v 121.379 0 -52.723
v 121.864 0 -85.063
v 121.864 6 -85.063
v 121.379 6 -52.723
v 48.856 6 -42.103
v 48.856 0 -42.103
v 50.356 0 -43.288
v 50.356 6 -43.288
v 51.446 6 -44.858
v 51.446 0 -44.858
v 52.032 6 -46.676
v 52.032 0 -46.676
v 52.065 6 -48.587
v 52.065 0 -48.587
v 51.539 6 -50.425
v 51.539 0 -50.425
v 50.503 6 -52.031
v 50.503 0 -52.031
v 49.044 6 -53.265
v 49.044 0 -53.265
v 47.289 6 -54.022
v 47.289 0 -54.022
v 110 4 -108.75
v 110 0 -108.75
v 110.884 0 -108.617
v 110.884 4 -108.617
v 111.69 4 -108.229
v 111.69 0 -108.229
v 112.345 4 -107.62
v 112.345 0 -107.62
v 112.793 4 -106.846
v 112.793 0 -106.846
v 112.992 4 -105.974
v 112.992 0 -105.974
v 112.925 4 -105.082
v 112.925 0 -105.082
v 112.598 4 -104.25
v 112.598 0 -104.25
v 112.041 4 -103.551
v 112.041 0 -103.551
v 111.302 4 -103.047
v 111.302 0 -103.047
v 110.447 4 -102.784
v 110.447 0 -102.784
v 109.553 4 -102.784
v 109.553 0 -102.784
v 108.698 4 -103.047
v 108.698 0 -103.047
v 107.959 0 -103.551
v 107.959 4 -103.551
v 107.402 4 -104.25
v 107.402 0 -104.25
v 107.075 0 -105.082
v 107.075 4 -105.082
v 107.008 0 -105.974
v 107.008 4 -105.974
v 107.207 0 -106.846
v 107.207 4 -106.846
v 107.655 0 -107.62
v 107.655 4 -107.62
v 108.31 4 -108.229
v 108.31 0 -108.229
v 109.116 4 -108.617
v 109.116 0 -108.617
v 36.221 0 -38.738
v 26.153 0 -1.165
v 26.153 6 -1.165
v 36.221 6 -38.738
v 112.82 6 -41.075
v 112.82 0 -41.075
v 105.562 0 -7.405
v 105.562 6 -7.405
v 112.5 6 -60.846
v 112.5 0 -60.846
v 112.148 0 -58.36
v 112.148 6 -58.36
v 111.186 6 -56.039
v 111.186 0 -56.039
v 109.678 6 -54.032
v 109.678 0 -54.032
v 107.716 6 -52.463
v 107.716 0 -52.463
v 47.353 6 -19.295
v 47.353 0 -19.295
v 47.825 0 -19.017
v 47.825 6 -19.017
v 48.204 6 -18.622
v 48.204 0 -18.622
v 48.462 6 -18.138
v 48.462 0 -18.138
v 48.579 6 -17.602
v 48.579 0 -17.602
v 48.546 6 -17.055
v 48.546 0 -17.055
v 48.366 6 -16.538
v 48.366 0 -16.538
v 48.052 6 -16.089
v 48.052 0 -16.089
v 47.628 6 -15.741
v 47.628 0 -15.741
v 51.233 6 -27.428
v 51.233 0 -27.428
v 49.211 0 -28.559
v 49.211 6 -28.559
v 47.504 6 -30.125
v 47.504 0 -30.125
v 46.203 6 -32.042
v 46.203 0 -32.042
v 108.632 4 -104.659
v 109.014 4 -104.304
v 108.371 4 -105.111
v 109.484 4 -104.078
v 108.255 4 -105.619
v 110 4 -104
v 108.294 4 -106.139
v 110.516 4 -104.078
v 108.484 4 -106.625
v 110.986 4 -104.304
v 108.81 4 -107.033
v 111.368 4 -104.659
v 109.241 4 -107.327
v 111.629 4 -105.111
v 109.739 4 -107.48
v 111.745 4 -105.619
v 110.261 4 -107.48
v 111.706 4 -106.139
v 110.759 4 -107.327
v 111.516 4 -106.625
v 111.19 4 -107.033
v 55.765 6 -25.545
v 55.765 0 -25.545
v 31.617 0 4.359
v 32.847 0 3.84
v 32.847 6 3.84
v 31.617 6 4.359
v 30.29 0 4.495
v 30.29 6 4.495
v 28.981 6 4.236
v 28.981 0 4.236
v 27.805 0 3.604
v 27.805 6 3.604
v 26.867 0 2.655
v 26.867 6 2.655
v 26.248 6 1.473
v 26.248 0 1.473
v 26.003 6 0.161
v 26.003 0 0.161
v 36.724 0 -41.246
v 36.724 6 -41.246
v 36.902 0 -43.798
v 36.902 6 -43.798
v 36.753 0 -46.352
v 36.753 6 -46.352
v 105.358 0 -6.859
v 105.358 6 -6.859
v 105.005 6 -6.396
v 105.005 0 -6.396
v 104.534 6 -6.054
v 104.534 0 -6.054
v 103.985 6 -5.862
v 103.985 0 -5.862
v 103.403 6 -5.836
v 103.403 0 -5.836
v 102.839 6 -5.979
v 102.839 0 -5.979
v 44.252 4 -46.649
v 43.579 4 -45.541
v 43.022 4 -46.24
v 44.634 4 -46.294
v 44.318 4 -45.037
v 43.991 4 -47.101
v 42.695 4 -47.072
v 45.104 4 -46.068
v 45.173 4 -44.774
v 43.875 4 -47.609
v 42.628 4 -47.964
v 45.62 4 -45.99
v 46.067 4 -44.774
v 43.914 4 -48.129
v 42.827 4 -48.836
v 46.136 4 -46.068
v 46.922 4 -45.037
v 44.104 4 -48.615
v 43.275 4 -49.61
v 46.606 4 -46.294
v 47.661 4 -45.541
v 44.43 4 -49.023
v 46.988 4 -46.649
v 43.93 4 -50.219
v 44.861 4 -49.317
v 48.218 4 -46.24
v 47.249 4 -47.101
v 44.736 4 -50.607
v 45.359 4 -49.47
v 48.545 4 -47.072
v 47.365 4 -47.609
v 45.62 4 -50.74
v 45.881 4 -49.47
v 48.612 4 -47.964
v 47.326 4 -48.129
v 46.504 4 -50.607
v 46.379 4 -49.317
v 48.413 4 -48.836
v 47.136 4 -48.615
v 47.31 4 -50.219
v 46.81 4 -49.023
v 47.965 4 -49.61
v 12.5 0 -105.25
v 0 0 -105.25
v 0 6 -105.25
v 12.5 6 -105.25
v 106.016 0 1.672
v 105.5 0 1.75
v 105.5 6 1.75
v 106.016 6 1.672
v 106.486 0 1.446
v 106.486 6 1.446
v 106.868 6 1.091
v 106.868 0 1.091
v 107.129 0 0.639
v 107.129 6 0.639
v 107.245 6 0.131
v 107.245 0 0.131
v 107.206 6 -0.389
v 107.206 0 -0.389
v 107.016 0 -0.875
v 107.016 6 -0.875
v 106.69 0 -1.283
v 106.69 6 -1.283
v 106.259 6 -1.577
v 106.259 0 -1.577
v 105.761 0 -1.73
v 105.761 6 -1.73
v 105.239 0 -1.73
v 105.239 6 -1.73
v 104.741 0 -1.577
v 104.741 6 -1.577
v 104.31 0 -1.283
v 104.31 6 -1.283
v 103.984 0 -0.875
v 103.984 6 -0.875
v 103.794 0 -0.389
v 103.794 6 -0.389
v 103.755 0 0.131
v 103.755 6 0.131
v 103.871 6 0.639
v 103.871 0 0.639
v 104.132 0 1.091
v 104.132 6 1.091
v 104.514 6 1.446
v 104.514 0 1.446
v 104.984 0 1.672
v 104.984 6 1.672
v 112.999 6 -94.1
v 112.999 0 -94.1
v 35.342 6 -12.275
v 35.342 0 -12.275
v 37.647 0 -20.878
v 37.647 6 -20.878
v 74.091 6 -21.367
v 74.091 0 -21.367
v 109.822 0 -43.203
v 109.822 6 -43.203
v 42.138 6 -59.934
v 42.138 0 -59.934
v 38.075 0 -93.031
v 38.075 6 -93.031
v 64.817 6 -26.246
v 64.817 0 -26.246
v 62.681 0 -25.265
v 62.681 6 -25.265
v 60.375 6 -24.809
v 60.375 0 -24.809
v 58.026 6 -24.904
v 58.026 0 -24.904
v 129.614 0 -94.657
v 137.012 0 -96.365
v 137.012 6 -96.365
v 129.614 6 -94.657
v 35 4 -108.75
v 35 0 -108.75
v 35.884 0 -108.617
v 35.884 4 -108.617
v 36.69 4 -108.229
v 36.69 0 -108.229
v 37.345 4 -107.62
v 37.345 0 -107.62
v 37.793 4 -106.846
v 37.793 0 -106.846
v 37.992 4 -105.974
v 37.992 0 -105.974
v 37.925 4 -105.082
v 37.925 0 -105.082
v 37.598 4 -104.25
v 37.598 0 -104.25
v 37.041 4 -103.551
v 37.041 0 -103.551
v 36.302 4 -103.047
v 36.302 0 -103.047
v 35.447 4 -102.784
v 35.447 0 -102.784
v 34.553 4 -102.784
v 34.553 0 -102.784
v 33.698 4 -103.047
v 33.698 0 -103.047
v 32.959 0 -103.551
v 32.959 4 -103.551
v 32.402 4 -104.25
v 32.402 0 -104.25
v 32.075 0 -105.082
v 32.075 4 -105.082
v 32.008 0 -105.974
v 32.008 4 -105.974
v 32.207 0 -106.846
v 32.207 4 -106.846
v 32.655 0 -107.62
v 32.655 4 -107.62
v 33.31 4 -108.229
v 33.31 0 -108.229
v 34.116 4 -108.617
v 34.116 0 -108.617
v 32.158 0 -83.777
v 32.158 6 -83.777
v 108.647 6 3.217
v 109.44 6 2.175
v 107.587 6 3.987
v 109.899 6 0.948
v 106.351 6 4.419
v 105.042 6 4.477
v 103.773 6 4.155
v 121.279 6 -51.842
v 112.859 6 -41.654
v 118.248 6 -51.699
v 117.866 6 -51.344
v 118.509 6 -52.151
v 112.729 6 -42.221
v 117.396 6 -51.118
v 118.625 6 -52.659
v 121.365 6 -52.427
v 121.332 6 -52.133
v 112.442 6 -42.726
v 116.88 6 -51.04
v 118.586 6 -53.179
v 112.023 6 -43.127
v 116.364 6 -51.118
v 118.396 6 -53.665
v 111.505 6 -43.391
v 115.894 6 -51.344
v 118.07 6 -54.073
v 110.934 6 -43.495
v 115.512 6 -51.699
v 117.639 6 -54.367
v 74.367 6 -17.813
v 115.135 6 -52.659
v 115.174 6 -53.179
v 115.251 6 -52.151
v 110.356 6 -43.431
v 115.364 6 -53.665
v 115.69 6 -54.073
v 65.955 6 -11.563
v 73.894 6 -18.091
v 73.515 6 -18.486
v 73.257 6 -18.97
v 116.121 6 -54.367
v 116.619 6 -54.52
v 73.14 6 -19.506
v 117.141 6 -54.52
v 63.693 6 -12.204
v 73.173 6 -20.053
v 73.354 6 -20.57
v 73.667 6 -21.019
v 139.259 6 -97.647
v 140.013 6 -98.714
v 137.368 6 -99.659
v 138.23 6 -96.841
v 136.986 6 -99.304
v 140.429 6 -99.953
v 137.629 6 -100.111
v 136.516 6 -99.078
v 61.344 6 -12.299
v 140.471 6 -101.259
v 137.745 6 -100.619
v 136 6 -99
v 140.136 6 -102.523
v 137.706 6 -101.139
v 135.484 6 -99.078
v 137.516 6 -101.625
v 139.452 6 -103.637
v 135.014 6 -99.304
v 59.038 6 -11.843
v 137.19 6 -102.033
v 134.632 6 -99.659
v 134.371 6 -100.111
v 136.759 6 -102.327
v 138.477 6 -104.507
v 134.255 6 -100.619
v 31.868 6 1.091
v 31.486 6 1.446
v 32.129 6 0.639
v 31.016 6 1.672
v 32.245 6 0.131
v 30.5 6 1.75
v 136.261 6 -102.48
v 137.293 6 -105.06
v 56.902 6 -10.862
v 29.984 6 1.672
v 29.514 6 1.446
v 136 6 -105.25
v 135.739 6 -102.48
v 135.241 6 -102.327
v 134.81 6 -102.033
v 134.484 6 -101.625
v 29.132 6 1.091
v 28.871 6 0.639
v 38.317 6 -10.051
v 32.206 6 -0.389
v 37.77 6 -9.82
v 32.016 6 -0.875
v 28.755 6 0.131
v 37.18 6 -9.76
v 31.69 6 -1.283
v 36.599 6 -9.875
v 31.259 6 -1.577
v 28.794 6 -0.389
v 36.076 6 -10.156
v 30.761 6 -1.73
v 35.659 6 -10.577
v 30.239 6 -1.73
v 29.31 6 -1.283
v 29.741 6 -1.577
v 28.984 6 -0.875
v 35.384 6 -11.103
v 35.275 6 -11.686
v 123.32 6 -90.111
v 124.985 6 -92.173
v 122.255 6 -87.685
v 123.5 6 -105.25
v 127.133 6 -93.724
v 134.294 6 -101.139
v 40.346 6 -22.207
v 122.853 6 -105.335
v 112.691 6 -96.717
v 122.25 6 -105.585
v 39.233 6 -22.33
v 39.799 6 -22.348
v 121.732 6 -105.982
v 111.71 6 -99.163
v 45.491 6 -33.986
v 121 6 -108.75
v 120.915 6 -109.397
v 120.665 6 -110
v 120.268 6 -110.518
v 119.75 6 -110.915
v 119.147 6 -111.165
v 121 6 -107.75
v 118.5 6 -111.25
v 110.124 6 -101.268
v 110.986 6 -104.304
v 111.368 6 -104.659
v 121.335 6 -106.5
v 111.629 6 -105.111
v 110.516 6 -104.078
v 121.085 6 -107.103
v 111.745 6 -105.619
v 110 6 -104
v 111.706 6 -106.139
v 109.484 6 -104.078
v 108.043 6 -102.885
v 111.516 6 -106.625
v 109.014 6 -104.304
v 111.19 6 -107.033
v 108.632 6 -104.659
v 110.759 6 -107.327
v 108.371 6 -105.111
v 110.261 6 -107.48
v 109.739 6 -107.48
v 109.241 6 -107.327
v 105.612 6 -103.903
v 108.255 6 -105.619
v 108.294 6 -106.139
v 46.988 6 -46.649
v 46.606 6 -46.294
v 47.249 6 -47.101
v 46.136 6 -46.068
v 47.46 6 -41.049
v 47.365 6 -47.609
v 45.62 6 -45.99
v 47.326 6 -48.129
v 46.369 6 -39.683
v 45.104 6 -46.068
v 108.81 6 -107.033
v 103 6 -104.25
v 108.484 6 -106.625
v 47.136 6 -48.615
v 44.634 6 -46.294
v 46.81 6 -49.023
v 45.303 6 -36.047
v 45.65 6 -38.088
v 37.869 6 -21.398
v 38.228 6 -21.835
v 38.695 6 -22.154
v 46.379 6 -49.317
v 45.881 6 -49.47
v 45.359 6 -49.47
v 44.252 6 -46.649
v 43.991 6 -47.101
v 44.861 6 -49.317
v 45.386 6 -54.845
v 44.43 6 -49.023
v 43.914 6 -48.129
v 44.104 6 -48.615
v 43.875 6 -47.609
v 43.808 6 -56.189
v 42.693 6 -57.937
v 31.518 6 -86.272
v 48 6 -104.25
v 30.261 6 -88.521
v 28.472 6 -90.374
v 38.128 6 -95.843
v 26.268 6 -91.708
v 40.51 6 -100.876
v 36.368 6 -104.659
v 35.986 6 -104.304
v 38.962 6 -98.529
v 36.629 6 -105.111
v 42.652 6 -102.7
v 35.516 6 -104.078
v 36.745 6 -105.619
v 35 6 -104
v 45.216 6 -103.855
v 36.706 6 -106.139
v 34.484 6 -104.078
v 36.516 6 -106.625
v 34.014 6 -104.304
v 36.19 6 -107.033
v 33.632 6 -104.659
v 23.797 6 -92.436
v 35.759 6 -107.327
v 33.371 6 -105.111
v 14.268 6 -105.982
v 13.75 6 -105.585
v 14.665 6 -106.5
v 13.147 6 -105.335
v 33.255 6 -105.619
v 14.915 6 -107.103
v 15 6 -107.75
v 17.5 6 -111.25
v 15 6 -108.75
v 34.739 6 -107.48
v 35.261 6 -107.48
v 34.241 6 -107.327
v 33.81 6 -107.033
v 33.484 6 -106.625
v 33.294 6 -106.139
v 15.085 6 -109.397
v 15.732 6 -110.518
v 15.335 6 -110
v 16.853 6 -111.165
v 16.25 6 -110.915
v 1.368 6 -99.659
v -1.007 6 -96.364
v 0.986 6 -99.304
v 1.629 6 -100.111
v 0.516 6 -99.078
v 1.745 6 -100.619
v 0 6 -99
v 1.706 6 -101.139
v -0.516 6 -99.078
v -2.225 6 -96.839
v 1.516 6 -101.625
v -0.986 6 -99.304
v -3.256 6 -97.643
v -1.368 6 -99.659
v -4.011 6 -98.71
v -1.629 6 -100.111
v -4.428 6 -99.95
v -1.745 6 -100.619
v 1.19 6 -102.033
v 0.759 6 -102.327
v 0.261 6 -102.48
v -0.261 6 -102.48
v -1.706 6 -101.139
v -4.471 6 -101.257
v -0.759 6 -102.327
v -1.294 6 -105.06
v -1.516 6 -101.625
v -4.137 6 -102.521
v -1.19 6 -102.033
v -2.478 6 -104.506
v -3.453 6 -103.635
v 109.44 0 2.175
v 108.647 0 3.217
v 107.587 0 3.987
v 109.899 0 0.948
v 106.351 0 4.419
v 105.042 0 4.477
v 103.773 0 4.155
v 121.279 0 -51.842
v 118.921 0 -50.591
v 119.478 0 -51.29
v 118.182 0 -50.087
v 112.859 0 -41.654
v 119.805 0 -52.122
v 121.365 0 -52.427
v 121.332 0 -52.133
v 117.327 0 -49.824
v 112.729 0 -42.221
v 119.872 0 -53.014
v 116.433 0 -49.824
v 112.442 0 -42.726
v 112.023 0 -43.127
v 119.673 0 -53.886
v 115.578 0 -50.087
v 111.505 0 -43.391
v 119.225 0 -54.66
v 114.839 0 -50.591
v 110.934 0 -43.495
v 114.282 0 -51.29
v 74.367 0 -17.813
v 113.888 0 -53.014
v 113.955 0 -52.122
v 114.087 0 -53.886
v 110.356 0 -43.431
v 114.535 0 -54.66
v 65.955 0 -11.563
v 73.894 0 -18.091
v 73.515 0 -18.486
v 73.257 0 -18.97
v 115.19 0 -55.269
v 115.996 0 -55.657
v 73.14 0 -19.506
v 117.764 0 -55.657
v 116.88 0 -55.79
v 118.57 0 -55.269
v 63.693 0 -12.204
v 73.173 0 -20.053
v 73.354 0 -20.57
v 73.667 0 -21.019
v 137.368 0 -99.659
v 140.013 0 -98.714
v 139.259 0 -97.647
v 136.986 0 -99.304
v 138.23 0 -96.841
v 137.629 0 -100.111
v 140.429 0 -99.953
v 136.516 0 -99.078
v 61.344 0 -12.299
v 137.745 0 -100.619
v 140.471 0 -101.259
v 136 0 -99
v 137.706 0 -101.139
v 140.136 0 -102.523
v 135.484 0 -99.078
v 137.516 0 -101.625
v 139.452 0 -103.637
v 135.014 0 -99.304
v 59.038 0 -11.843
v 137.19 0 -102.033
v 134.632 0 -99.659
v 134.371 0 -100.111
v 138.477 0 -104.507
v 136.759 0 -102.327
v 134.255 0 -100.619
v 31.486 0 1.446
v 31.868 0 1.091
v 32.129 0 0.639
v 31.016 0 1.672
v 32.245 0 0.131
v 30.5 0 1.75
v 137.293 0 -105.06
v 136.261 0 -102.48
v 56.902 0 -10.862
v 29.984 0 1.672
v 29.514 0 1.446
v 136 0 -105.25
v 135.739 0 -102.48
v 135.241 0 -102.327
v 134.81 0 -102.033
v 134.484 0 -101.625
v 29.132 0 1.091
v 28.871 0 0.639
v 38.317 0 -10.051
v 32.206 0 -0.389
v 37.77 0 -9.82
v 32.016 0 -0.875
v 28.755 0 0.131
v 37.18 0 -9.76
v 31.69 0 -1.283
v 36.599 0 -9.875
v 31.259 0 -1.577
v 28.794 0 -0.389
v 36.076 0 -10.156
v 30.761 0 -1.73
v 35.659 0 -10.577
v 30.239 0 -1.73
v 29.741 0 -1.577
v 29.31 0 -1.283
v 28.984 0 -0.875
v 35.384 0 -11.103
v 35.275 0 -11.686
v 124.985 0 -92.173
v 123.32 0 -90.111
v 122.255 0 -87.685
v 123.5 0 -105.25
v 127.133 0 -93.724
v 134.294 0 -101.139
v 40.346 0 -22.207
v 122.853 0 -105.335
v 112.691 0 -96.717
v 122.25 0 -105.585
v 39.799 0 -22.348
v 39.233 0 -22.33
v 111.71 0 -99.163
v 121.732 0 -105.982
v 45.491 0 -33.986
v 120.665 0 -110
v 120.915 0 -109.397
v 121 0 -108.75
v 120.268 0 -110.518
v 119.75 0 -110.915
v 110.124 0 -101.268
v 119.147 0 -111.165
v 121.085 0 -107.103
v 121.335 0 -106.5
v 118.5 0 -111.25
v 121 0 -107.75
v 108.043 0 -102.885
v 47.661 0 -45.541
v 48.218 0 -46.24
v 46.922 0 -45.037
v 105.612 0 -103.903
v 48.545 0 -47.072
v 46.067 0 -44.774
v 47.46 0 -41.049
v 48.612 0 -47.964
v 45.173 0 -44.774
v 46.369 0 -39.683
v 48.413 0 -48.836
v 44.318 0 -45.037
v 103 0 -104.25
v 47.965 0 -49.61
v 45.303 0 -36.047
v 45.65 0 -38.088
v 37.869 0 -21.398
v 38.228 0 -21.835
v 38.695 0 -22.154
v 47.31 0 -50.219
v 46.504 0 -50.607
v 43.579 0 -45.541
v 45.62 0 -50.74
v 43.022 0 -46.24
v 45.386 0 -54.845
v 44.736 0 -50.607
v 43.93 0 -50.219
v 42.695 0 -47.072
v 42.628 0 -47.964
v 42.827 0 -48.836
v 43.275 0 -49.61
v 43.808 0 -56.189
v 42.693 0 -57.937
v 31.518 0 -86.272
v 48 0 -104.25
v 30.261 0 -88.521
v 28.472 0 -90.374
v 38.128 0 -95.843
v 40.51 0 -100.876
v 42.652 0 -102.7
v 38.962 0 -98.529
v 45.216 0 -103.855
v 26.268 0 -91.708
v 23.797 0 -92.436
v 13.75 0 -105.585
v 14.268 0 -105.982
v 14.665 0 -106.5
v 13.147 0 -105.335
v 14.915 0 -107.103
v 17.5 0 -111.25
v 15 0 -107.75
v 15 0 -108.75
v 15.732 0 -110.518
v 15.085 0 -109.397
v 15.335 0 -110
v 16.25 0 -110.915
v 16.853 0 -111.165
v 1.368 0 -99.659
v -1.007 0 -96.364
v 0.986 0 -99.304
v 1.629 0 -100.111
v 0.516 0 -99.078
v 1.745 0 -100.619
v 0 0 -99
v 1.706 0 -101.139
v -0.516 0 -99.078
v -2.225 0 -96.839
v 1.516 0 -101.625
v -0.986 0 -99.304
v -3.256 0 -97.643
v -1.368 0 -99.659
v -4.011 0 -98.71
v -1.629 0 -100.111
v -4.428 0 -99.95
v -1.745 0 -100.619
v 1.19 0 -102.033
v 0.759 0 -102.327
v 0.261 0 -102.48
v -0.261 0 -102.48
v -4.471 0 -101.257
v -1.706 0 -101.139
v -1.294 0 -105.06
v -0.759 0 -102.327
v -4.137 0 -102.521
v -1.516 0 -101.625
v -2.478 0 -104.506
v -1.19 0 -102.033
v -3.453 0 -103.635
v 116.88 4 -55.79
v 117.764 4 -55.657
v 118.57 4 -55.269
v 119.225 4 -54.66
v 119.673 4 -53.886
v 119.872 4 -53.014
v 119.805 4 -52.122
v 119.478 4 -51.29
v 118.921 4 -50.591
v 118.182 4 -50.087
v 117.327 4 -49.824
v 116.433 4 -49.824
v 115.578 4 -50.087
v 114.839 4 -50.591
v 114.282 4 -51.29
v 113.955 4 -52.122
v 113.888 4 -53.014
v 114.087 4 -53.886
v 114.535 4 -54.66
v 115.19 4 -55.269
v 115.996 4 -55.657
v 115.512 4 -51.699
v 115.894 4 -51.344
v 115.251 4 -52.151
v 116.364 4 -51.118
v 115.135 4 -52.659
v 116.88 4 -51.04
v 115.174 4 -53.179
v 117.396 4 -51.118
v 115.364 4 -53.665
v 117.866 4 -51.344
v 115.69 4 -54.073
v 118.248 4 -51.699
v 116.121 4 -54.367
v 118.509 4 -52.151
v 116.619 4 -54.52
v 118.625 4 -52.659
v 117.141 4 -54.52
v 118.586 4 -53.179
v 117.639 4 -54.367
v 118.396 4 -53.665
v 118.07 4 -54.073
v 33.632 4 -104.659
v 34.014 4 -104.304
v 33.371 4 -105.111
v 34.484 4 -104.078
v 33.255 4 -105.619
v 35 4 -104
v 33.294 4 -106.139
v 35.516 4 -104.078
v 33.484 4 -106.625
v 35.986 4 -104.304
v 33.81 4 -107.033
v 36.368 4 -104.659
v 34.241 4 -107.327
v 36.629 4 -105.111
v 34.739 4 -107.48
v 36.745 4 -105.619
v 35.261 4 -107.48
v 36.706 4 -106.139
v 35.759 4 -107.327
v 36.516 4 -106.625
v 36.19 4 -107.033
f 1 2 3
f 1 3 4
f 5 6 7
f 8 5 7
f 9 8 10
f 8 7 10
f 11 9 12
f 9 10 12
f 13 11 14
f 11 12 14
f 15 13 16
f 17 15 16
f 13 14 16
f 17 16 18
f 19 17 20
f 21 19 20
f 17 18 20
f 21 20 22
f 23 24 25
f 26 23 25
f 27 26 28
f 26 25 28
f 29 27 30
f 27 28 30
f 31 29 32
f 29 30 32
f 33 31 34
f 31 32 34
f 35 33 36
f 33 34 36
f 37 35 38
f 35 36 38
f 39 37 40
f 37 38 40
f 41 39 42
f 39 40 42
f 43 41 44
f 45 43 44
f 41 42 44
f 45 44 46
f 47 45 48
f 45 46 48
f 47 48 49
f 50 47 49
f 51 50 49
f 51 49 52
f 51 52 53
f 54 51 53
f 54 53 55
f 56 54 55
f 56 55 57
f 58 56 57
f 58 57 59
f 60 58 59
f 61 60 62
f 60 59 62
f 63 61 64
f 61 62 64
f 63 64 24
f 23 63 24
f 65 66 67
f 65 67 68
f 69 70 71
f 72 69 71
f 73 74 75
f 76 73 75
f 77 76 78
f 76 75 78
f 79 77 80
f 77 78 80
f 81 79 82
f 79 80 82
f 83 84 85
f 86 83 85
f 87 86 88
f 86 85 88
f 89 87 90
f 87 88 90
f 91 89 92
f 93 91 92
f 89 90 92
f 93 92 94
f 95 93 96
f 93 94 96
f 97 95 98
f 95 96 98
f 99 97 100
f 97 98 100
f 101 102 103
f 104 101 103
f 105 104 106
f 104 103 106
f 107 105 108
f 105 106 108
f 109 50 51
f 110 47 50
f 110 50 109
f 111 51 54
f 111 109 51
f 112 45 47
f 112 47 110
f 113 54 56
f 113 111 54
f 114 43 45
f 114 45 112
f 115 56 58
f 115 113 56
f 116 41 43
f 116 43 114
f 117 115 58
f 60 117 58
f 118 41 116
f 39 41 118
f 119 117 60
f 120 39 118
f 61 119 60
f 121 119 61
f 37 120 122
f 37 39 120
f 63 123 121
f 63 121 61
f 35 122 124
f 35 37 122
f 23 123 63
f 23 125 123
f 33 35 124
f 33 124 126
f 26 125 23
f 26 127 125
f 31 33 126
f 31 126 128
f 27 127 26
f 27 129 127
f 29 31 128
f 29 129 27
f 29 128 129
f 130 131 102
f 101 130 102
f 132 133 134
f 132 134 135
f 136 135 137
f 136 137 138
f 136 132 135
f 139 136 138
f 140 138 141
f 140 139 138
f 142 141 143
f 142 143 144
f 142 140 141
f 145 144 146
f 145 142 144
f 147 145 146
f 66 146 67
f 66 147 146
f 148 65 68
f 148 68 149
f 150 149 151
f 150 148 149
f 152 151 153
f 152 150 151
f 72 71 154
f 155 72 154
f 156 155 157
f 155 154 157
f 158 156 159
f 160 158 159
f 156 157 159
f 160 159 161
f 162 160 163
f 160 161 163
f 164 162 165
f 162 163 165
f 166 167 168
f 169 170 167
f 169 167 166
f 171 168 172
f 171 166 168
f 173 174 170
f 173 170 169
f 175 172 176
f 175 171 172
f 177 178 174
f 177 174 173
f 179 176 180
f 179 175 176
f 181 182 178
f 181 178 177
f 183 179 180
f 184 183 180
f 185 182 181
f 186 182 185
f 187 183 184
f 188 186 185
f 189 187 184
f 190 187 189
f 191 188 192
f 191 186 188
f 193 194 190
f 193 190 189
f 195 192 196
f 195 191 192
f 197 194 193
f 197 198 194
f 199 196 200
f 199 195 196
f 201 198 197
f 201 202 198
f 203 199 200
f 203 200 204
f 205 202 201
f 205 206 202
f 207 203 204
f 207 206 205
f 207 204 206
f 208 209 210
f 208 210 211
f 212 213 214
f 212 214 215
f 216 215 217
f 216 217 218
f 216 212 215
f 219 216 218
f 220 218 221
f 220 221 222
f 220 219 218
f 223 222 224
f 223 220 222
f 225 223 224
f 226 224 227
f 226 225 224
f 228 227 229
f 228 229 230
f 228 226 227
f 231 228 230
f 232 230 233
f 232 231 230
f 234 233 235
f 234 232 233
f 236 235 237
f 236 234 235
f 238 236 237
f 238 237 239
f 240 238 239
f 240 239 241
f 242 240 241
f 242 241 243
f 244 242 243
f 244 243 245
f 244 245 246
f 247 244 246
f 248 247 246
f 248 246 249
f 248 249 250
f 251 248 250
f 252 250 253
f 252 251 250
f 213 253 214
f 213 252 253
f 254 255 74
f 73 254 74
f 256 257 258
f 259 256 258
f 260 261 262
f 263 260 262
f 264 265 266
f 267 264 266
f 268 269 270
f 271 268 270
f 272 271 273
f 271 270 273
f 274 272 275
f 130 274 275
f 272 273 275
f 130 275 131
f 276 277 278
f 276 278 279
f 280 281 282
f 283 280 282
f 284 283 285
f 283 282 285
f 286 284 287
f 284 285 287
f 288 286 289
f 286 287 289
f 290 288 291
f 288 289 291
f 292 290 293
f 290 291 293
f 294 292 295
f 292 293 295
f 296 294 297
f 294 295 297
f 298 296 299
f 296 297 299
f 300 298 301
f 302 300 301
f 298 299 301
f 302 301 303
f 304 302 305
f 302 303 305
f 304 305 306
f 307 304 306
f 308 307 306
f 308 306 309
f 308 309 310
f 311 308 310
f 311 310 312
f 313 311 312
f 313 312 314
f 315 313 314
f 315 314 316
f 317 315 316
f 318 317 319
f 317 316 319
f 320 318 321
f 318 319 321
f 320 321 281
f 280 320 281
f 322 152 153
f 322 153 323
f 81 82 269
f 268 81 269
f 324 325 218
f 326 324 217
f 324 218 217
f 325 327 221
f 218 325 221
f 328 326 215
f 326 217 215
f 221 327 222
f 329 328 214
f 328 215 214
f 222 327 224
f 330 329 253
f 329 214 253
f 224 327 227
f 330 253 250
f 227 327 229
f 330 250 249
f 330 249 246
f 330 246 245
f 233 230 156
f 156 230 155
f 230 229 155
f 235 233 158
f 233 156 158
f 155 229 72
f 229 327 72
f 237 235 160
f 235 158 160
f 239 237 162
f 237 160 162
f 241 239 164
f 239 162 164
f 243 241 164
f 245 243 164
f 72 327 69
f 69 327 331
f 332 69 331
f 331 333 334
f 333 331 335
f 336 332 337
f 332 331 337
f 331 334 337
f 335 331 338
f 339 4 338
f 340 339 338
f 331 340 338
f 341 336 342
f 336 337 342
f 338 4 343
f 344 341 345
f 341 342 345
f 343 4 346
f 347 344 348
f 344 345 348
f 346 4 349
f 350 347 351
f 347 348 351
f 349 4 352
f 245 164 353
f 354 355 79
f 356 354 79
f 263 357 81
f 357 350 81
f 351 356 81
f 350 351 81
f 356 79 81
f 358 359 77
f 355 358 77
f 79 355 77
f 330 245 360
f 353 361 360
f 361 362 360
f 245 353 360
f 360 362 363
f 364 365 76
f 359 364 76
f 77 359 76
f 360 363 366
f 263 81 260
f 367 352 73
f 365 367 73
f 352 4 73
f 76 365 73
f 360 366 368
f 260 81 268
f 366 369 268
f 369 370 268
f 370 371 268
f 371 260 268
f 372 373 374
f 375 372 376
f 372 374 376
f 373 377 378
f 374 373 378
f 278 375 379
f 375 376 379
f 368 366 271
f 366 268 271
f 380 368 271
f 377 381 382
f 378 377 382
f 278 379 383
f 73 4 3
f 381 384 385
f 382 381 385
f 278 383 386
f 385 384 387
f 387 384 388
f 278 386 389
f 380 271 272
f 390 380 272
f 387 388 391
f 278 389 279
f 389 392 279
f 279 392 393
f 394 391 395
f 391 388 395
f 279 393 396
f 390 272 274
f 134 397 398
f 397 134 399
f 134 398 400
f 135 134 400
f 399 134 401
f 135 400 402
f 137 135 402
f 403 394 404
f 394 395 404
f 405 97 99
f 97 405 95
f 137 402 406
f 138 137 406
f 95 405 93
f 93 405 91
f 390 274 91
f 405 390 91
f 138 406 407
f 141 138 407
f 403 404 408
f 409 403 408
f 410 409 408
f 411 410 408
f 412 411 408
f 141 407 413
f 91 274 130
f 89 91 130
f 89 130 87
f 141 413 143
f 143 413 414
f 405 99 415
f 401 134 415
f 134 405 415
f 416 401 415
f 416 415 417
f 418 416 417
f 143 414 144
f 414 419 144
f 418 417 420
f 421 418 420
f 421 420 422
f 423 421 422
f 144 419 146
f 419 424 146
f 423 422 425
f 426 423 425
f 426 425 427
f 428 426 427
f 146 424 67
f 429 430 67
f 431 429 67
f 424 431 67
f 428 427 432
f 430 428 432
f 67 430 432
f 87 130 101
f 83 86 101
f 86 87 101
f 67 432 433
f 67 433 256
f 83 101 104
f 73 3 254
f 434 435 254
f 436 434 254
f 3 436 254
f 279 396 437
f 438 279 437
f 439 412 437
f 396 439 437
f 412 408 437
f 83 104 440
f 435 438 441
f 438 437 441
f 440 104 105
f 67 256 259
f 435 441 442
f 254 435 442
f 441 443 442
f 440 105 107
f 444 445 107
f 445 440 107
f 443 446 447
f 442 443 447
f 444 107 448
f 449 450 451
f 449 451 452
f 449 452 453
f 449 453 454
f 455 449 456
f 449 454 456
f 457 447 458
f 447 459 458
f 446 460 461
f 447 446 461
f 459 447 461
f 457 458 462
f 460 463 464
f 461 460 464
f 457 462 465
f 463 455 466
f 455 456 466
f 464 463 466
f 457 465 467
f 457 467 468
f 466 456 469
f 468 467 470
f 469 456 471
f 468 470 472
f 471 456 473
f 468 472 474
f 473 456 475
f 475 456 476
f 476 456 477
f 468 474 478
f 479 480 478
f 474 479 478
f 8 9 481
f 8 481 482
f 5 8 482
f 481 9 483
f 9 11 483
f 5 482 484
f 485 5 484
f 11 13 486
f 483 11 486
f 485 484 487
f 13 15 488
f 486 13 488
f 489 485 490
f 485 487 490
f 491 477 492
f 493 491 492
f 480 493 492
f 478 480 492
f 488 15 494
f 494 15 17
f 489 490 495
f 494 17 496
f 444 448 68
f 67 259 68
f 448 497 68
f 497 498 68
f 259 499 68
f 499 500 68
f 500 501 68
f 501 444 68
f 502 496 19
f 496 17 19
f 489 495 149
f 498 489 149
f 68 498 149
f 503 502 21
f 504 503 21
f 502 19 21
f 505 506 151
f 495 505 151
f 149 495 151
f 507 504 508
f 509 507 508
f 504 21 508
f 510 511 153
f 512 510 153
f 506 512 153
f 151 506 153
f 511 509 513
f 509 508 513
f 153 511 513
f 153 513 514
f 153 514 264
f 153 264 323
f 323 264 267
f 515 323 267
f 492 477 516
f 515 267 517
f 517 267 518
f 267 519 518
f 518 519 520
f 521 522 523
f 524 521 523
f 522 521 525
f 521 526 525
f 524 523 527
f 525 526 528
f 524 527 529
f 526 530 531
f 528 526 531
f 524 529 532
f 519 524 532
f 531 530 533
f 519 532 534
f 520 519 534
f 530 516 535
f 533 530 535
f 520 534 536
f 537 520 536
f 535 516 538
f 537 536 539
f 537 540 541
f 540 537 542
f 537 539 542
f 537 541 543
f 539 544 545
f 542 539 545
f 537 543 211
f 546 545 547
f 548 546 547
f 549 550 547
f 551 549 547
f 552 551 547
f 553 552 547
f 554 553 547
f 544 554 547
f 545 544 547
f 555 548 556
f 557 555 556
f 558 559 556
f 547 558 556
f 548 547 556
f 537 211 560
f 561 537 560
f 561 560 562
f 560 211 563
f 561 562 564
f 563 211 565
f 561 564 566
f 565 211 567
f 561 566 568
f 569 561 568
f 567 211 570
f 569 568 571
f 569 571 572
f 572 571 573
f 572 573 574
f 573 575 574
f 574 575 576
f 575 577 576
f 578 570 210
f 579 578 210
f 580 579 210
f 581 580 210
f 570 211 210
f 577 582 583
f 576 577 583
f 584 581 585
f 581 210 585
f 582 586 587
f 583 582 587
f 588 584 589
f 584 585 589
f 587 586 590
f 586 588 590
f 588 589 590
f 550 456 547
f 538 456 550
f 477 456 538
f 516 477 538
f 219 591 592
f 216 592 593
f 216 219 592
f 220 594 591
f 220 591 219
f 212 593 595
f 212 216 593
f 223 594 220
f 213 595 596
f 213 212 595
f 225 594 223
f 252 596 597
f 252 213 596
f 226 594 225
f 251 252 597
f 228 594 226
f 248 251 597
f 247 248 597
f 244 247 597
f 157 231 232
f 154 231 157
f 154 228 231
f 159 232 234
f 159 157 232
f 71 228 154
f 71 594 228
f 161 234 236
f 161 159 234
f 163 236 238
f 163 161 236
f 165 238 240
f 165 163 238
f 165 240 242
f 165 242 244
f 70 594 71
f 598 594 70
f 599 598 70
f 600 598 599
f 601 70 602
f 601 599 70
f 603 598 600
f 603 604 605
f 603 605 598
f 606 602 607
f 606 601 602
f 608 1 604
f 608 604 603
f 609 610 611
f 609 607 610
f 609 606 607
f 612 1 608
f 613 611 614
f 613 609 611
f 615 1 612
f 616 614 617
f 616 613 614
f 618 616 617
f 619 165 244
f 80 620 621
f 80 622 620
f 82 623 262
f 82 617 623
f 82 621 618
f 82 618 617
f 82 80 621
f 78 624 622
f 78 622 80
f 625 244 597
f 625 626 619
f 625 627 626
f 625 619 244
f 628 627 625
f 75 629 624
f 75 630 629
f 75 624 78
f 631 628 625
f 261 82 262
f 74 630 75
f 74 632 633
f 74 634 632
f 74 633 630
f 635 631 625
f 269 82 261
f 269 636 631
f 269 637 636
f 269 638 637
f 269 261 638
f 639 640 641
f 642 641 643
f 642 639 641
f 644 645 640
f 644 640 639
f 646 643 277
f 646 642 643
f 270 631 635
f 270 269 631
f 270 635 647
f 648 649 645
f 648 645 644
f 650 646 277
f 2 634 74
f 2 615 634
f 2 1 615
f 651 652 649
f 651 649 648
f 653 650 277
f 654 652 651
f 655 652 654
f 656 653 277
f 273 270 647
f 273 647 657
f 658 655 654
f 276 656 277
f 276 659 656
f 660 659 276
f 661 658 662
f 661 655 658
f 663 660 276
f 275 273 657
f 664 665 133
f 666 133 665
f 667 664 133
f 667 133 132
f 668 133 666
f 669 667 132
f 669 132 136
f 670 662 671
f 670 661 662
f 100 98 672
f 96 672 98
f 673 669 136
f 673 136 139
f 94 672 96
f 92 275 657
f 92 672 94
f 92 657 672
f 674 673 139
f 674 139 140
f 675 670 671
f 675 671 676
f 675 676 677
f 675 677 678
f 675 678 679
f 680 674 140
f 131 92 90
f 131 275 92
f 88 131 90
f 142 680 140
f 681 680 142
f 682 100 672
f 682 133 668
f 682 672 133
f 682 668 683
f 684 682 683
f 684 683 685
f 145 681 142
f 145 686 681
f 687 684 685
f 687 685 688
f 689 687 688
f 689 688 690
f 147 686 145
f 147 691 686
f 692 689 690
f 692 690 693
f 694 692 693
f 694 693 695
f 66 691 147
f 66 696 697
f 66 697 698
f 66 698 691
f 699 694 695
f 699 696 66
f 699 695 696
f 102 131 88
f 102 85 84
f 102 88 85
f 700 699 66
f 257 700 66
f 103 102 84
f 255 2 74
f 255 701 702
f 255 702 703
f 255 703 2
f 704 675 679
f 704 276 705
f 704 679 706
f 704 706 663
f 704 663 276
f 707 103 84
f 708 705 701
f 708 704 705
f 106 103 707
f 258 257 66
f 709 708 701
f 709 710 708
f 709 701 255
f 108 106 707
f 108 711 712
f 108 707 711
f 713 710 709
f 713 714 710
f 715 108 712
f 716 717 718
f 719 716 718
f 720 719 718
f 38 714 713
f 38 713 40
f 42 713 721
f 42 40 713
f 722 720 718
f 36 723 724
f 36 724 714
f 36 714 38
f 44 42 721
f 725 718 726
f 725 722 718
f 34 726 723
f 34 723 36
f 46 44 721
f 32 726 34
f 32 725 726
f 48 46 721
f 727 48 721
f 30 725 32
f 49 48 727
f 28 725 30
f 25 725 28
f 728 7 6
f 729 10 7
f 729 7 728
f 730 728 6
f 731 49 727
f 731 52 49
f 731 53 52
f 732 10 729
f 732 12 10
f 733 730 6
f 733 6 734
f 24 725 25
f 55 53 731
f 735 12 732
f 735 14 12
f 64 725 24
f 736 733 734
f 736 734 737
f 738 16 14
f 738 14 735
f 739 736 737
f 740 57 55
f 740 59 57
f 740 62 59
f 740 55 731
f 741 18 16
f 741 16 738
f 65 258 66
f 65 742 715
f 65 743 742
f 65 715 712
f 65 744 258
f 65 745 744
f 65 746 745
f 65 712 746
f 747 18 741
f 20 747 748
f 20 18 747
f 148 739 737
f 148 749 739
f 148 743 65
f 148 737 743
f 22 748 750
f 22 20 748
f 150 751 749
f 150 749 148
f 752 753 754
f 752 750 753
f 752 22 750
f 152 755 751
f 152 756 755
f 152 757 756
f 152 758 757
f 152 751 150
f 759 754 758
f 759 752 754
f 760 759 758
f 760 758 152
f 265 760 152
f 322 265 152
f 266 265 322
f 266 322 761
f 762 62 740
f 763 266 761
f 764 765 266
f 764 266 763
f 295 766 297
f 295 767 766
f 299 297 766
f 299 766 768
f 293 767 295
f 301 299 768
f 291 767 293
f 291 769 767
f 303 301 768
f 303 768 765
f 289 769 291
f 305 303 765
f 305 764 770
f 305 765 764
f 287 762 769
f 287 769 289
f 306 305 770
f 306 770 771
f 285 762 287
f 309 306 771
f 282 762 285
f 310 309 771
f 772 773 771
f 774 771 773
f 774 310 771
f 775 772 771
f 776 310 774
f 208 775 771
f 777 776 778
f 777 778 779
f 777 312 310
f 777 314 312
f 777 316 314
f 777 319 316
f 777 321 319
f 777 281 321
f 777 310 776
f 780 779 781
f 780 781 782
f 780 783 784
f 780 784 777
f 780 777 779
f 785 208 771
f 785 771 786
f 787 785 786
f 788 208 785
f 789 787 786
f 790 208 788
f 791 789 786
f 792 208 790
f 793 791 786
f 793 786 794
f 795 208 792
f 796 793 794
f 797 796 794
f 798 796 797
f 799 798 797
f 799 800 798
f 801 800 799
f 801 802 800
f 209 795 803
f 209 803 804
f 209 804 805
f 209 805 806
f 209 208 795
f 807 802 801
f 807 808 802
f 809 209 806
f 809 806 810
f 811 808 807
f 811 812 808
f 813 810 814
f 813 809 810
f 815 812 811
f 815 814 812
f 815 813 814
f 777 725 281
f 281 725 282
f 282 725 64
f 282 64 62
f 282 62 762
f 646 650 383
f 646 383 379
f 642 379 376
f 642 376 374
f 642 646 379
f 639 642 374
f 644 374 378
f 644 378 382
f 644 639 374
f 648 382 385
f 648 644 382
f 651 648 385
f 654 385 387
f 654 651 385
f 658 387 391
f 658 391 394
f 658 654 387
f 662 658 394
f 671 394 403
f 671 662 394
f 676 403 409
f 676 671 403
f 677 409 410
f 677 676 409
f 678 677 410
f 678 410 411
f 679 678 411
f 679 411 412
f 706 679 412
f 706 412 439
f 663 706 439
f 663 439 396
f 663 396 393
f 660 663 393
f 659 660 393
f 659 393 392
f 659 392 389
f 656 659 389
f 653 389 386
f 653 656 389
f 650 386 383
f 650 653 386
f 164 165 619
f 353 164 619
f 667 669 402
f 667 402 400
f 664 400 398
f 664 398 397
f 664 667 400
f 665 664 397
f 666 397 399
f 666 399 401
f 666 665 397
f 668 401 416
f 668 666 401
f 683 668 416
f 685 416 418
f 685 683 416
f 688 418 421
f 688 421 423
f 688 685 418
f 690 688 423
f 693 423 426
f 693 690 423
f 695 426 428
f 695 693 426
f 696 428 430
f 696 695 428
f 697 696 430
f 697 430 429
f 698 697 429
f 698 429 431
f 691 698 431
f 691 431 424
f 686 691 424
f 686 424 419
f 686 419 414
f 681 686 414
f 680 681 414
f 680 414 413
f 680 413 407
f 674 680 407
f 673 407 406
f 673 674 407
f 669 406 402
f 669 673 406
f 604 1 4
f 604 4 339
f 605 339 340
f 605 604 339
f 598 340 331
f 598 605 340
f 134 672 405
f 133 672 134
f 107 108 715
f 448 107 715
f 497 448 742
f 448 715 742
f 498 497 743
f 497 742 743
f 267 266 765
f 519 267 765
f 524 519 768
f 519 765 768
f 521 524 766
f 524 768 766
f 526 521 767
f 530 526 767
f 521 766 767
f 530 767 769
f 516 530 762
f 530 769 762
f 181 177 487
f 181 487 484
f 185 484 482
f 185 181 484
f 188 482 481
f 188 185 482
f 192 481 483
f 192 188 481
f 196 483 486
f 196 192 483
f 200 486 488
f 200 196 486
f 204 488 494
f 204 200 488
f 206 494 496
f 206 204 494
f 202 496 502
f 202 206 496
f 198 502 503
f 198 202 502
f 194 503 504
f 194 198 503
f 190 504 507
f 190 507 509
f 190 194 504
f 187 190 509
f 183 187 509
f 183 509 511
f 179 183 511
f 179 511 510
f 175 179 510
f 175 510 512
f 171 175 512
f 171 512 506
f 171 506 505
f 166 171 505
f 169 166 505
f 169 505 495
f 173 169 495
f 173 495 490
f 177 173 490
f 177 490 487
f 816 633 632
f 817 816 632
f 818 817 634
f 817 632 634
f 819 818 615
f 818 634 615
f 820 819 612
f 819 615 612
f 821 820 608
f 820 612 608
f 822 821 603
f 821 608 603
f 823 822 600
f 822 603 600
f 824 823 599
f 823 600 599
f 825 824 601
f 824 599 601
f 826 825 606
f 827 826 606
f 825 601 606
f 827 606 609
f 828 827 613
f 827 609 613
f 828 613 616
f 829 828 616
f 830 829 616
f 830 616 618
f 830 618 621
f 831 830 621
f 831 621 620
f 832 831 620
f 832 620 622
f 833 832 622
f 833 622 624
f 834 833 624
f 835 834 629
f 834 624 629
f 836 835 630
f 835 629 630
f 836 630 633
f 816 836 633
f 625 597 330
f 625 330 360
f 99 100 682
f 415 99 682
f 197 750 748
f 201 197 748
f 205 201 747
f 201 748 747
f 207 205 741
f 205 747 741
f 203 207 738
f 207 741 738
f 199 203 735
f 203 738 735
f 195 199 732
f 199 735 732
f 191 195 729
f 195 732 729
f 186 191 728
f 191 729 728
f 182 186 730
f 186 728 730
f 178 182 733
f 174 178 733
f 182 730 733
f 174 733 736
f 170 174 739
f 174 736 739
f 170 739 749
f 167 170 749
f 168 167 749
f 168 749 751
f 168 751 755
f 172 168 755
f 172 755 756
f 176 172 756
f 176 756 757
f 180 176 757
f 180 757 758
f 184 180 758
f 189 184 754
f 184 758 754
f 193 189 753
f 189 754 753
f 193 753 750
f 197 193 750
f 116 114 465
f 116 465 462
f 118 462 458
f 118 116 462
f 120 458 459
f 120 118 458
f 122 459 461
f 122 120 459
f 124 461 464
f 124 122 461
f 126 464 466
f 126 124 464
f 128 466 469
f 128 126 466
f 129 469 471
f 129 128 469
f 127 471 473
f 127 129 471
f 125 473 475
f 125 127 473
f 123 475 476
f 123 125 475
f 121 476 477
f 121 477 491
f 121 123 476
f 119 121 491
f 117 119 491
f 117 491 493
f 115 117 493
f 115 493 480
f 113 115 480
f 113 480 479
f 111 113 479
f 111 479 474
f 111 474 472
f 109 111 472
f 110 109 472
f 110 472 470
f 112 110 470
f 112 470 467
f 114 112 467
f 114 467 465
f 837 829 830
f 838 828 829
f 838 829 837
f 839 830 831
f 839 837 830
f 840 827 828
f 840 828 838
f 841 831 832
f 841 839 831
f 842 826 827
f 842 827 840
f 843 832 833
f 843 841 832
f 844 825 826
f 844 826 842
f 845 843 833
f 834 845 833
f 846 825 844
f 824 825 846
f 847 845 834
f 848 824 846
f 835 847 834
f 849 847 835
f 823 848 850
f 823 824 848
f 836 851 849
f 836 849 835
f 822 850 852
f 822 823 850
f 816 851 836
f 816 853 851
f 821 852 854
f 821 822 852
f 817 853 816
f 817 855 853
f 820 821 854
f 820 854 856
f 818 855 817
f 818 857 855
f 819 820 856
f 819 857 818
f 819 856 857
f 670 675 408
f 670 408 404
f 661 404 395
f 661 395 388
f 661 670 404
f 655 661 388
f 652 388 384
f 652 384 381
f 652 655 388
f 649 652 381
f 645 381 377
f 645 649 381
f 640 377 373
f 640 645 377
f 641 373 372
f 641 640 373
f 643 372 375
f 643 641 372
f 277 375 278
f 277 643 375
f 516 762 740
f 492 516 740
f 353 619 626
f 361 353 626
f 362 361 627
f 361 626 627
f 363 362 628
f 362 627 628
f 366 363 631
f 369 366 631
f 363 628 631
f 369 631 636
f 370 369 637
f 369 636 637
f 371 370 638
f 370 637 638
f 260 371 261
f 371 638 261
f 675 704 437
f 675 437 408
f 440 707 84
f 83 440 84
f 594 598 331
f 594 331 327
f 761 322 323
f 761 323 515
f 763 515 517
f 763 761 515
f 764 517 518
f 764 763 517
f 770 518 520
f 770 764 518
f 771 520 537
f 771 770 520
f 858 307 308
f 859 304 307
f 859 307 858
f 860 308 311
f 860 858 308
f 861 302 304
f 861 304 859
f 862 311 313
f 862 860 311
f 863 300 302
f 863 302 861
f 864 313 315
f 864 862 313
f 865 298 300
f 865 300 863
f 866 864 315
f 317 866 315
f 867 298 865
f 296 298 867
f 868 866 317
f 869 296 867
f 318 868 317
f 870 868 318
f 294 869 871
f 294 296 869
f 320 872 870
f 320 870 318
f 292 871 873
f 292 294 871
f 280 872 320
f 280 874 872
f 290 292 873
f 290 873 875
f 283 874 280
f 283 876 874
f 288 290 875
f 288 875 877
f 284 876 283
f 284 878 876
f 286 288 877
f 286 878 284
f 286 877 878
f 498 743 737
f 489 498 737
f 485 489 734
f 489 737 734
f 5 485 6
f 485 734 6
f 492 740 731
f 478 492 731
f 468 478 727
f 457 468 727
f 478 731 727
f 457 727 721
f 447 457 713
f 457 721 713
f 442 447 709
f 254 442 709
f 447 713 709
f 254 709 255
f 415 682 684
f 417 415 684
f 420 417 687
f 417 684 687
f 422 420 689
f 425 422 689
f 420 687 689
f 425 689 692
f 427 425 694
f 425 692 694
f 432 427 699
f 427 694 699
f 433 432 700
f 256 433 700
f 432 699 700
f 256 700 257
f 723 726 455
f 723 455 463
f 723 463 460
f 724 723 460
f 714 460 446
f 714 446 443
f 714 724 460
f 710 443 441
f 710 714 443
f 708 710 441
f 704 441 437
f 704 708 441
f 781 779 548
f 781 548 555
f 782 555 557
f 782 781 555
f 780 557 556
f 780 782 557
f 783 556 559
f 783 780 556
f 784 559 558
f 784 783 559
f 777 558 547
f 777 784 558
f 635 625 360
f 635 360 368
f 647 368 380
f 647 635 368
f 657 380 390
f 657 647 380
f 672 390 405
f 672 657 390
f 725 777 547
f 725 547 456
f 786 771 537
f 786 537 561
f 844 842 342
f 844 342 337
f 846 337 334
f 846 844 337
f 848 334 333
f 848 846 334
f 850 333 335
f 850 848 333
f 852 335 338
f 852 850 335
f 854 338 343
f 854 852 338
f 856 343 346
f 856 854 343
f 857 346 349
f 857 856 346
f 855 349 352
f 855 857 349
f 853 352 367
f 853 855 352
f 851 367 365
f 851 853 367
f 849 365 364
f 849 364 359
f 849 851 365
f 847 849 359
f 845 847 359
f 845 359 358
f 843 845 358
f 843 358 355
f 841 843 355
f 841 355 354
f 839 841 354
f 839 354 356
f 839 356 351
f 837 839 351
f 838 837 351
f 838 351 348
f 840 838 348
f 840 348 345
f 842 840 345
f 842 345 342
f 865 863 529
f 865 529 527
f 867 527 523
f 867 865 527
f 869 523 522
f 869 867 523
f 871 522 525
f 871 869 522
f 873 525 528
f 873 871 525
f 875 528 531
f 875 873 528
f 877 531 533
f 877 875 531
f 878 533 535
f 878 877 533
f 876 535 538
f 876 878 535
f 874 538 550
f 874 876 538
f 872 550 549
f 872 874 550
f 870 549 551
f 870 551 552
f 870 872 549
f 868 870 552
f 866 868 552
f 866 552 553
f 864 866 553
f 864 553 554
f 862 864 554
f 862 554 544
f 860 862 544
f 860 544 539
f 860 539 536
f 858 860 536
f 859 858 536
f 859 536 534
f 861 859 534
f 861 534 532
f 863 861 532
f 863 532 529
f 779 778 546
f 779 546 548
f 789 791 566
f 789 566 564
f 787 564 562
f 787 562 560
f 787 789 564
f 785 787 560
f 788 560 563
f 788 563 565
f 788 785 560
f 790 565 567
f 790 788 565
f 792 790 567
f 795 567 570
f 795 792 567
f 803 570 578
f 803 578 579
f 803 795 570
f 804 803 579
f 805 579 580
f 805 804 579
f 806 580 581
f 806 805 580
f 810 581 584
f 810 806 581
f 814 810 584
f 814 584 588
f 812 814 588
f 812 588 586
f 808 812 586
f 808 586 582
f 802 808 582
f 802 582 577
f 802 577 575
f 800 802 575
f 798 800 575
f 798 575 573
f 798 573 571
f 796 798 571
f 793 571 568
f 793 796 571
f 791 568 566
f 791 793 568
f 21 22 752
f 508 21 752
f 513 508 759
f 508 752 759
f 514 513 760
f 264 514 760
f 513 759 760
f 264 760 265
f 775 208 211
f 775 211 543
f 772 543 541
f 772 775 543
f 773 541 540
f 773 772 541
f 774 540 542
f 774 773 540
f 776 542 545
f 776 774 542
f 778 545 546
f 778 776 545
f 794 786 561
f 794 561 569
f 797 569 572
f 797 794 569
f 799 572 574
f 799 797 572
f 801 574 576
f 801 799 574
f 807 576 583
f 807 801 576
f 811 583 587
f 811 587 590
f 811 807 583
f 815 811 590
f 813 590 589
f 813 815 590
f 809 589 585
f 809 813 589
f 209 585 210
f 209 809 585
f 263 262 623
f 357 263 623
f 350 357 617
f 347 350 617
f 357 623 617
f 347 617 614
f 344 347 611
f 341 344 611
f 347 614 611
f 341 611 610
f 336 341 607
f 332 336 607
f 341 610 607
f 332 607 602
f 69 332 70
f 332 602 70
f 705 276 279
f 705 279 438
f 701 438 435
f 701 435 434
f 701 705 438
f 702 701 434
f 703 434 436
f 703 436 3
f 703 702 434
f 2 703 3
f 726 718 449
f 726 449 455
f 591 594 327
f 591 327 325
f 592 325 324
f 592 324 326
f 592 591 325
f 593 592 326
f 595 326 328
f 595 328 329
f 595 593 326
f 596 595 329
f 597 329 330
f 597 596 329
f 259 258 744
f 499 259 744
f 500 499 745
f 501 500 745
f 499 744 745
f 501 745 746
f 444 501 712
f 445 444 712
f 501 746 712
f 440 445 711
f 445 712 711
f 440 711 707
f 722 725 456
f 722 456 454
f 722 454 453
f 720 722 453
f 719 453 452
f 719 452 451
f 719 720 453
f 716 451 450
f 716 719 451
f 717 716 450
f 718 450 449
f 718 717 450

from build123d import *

# Parameters (mm, degrees)
SKETCH_1_R          = 1.75
EXTRUDE_1_DEPTH     = 6
SKETCH_2_R          = 3
CUT_EXTRUDE_1_DEPTH = 4


with BuildPart() as part:
    # Эскиз1 → Бобышка-Вытянуть1 (new body)
    with BuildSketch(Plane(origin=(0, 0, 0), x_dir=(1, 0, 0), z_dir=(0, 1, 0))):
        with BuildLine():
            Line((0, 105.25), (12.5, 105.25))
            ThreePointArc((12.5, 105.25), (14.267766953, 105.982233047), (15, 107.75))
            Line((15, 107.75), (15, 108.75))
            ThreePointArc((15, 108.75), (15.732233047, 110.517766953), (17.5, 111.25))
            Line((17.5, 111.25), (118.5, 111.25))
            ThreePointArc((118.5, 111.25), (120.267766953, 110.517766953), (121, 108.75))
            Line((121, 108.75), (121, 107.75))
            ThreePointArc((121, 107.75), (121.732233047, 105.982233047), (123.5, 105.25))
            Line((123.5, 105.25), (136, 105.25))
            ThreePointArc((136, 105.25), (140.471073351, 101.259414462), (137.012279745, 96.365334708))
            Line((137.012279745, 96.365334708), (129.613763077, 94.657252548))
            ThreePointArc((129.613763077, 94.657252548), (124.08407631, 91.197188523), (121.864397453, 85.063469865))
            Line((121.864397453, 85.063469865), (121.379494275, 52.722536916))
            ThreePointArc((121.379494275, 52.722536916), (121.35096588, 52.279643163), (121.278949063, 51.841713576))
            Line((121.278949063, 51.841713576), (109.898949063, -0.948286424))
            ThreePointArc((109.898949063, -0.948286424), (107.58711076, -3.986724053), (103.772892877, -4.155370138))
            Line((103.772892877, -4.155370138), (65.954927395, 11.563007621))
            ThreePointArc((65.954927395, 11.563007621), (61.344389675, 12.298967601), (56.902251647, 10.861572422))
            Line((56.902251647, 10.861572422), (32.846596964, -3.839724299))
            ThreePointArc((32.846596964, -3.839724299), (27.805357329, -3.604011776), (26.153333782, 1.164685703))
            Line((26.153333782, 1.164685703), (36.221084572, 38.73804317))
            ThreePointArc((36.221084572, 38.73804317), (36.853849051, 42.519294597), (36.753491079, 46.35181094))
            Line((36.753491079, 46.35181094), (32.158216583, 83.777318367))
            ThreePointArc((32.158216583, 83.777318367), (29.42615307, 89.505208638), (23.797099717, 92.435508339))
            Line((23.797099717, 92.435508339), (-1.006615848, 96.364030947))
            ThreePointArc((-1.006615848, 96.364030947), (-4.471401388, 101.256527029), (0, 105.25))
        make_face()
        with Locations(Location((35, 105.75, 0), (0, 0, 270))):
            Circle(SKETCH_1_R, mode=Mode.SUBTRACT)
        with Locations(Location((110, 105.75, 0), (0, 0, 270))):
            Circle(SKETCH_1_R, mode=Mode.SUBTRACT)
        with Locations(Location((116.88, 52.79, 0), (0, 0, 270))):
            Circle(SKETCH_1_R, mode=Mode.SUBTRACT)
        with Locations(Location((45.62, 47.74, 0), (0, 0, 270))):
            Circle(SKETCH_1_R, mode=Mode.SUBTRACT)
        with Locations(Location((0, 100.75, 0), (0, 0, 270))):
            Circle(SKETCH_1_R, mode=Mode.SUBTRACT)
        with Locations(Location((136, 100.75, 0), (0, 0, 270))):
            Circle(SKETCH_1_R, mode=Mode.SUBTRACT)
        with Locations(Location((30.5, 0, 0), (0, 0, 270))):
            Circle(SKETCH_1_R, mode=Mode.SUBTRACT)
        with Locations(Location((105.5, 0, 0), (0, 0, 270))):
            Circle(SKETCH_1_R, mode=Mode.SUBTRACT)
        with BuildLine():
            Line((48, 104.25), (103, 104.25))
            ThreePointArc((103, 104.25), (110.123874635, 101.267863648), (112.998876167, 94.100082036))
            Line((112.998876167, 94.100082036), (112.500284745, 60.846202729))
            ThreePointArc((112.500284745, 60.846202729), (111.186497255, 56.039384402), (107.716068497, 52.46340003))
            Line((107.716068497, 52.46340003), (64.817208881, 26.246326643))
            ThreePointArc((64.817208881, 26.246326643), (60.375070853, 24.808931464), (55.764533132, 25.544891444))
            Line((55.764533132, 25.544891444), (51.232831469, 27.428414202))
            ThreePointArc((51.232831469, 27.428414202), (48.311891769, 29.292595834), (46.202504042, 32.041694834))
            ThreePointArc((46.202504042, 32.041694834), (45.33035863, 35.010535959), (45.650081265, 38.088267701))
            ThreePointArc((45.650081265, 38.088267701), (46.871495682, 40.400347733), (48.856177376, 42.102876976))
            ThreePointArc((48.856177376, 42.102876976), (52.06452504, 48.587406051), (47.288889887, 54.02210208))
            ThreePointArc((47.288889887, 54.02210208), (43.80810358, 56.18938194), (42.138332857, 59.934357378))
            Line((42.138332857, 59.934357378), (38.074538484, 93.031306566))
            ThreePointArc((38.074538484, 93.031306566), (40.510442792, 100.876200482), (48, 104.25))
        make_face(mode=Mode.SUBTRACT)
        with BuildLine():
            Line((112.820087132, 41.07481604), (105.561751128, 7.404556143))
            ThreePointArc((105.561751128, 7.404556143), (104.534267438, 6.054139419), (102.83905949, 5.979185604))
            Line((102.83905949, 5.979185604), (74.366820735, 17.81317505))
            ThreePointArc((74.366820735, 17.81317505), (73.140400732, 19.505501844), (74.091491917, 21.366550355))
            Line((74.091491917, 21.366550355), (109.822066675, 43.202820805))
            ThreePointArc((109.822066675, 43.202820805), (112.022629186, 43.127194072), (112.820087132, 41.07481604))
        make_face(mode=Mode.SUBTRACT)
        with BuildLine():
            Line((47.62796861, 15.74134871), (38.316811752, 10.050957756))
            ThreePointArc((38.316811752, 10.050957756), (36.076260803, 10.155718878), (35.342028115, 12.275139979))
            Line((35.342028115, 12.275139979), (37.647028294, 20.87751776))
            ThreePointArc((37.647028294, 20.87751776), (38.695388466, 22.154160251), (40.346483113, 22.206710843))
            Line((40.346483113, 22.206710843), (47.352639792, 19.294724015))
            ThreePointArc((47.352639792, 19.294724015), (48.579059795, 17.602397221), (47.62796861, 15.74134871))
        make_face(mode=Mode.SUBTRACT)
    extrude(amount=EXTRUDE_1_DEPTH)

    # Эскиз2 → Вырез-Вытянуть1 (cut)
    with BuildSketch(Plane(origin=(0, 0, 0), x_dir=(-1, 0, 0), z_dir=(0, -1, 0))):
        with Locations(Location((-110, 105.75, 0), (0, 0, 90))):
            Circle(SKETCH_2_R)
        with Locations(Location((-35, 105.75, 0), (0, 0, 90))):
            Circle(SKETCH_2_R)
        with Locations(Location((-116.88, 52.79, 0), (0, 0, 90))):
            Circle(SKETCH_2_R)
        with Locations(Location((-45.62, 47.74, 0), (0, 0, 90))):
            Circle(SKETCH_2_R)
    extrude(amount=-CUT_EXTRUDE_1_DEPTH, mode=Mode.SUBTRACT)


solid = part.part
